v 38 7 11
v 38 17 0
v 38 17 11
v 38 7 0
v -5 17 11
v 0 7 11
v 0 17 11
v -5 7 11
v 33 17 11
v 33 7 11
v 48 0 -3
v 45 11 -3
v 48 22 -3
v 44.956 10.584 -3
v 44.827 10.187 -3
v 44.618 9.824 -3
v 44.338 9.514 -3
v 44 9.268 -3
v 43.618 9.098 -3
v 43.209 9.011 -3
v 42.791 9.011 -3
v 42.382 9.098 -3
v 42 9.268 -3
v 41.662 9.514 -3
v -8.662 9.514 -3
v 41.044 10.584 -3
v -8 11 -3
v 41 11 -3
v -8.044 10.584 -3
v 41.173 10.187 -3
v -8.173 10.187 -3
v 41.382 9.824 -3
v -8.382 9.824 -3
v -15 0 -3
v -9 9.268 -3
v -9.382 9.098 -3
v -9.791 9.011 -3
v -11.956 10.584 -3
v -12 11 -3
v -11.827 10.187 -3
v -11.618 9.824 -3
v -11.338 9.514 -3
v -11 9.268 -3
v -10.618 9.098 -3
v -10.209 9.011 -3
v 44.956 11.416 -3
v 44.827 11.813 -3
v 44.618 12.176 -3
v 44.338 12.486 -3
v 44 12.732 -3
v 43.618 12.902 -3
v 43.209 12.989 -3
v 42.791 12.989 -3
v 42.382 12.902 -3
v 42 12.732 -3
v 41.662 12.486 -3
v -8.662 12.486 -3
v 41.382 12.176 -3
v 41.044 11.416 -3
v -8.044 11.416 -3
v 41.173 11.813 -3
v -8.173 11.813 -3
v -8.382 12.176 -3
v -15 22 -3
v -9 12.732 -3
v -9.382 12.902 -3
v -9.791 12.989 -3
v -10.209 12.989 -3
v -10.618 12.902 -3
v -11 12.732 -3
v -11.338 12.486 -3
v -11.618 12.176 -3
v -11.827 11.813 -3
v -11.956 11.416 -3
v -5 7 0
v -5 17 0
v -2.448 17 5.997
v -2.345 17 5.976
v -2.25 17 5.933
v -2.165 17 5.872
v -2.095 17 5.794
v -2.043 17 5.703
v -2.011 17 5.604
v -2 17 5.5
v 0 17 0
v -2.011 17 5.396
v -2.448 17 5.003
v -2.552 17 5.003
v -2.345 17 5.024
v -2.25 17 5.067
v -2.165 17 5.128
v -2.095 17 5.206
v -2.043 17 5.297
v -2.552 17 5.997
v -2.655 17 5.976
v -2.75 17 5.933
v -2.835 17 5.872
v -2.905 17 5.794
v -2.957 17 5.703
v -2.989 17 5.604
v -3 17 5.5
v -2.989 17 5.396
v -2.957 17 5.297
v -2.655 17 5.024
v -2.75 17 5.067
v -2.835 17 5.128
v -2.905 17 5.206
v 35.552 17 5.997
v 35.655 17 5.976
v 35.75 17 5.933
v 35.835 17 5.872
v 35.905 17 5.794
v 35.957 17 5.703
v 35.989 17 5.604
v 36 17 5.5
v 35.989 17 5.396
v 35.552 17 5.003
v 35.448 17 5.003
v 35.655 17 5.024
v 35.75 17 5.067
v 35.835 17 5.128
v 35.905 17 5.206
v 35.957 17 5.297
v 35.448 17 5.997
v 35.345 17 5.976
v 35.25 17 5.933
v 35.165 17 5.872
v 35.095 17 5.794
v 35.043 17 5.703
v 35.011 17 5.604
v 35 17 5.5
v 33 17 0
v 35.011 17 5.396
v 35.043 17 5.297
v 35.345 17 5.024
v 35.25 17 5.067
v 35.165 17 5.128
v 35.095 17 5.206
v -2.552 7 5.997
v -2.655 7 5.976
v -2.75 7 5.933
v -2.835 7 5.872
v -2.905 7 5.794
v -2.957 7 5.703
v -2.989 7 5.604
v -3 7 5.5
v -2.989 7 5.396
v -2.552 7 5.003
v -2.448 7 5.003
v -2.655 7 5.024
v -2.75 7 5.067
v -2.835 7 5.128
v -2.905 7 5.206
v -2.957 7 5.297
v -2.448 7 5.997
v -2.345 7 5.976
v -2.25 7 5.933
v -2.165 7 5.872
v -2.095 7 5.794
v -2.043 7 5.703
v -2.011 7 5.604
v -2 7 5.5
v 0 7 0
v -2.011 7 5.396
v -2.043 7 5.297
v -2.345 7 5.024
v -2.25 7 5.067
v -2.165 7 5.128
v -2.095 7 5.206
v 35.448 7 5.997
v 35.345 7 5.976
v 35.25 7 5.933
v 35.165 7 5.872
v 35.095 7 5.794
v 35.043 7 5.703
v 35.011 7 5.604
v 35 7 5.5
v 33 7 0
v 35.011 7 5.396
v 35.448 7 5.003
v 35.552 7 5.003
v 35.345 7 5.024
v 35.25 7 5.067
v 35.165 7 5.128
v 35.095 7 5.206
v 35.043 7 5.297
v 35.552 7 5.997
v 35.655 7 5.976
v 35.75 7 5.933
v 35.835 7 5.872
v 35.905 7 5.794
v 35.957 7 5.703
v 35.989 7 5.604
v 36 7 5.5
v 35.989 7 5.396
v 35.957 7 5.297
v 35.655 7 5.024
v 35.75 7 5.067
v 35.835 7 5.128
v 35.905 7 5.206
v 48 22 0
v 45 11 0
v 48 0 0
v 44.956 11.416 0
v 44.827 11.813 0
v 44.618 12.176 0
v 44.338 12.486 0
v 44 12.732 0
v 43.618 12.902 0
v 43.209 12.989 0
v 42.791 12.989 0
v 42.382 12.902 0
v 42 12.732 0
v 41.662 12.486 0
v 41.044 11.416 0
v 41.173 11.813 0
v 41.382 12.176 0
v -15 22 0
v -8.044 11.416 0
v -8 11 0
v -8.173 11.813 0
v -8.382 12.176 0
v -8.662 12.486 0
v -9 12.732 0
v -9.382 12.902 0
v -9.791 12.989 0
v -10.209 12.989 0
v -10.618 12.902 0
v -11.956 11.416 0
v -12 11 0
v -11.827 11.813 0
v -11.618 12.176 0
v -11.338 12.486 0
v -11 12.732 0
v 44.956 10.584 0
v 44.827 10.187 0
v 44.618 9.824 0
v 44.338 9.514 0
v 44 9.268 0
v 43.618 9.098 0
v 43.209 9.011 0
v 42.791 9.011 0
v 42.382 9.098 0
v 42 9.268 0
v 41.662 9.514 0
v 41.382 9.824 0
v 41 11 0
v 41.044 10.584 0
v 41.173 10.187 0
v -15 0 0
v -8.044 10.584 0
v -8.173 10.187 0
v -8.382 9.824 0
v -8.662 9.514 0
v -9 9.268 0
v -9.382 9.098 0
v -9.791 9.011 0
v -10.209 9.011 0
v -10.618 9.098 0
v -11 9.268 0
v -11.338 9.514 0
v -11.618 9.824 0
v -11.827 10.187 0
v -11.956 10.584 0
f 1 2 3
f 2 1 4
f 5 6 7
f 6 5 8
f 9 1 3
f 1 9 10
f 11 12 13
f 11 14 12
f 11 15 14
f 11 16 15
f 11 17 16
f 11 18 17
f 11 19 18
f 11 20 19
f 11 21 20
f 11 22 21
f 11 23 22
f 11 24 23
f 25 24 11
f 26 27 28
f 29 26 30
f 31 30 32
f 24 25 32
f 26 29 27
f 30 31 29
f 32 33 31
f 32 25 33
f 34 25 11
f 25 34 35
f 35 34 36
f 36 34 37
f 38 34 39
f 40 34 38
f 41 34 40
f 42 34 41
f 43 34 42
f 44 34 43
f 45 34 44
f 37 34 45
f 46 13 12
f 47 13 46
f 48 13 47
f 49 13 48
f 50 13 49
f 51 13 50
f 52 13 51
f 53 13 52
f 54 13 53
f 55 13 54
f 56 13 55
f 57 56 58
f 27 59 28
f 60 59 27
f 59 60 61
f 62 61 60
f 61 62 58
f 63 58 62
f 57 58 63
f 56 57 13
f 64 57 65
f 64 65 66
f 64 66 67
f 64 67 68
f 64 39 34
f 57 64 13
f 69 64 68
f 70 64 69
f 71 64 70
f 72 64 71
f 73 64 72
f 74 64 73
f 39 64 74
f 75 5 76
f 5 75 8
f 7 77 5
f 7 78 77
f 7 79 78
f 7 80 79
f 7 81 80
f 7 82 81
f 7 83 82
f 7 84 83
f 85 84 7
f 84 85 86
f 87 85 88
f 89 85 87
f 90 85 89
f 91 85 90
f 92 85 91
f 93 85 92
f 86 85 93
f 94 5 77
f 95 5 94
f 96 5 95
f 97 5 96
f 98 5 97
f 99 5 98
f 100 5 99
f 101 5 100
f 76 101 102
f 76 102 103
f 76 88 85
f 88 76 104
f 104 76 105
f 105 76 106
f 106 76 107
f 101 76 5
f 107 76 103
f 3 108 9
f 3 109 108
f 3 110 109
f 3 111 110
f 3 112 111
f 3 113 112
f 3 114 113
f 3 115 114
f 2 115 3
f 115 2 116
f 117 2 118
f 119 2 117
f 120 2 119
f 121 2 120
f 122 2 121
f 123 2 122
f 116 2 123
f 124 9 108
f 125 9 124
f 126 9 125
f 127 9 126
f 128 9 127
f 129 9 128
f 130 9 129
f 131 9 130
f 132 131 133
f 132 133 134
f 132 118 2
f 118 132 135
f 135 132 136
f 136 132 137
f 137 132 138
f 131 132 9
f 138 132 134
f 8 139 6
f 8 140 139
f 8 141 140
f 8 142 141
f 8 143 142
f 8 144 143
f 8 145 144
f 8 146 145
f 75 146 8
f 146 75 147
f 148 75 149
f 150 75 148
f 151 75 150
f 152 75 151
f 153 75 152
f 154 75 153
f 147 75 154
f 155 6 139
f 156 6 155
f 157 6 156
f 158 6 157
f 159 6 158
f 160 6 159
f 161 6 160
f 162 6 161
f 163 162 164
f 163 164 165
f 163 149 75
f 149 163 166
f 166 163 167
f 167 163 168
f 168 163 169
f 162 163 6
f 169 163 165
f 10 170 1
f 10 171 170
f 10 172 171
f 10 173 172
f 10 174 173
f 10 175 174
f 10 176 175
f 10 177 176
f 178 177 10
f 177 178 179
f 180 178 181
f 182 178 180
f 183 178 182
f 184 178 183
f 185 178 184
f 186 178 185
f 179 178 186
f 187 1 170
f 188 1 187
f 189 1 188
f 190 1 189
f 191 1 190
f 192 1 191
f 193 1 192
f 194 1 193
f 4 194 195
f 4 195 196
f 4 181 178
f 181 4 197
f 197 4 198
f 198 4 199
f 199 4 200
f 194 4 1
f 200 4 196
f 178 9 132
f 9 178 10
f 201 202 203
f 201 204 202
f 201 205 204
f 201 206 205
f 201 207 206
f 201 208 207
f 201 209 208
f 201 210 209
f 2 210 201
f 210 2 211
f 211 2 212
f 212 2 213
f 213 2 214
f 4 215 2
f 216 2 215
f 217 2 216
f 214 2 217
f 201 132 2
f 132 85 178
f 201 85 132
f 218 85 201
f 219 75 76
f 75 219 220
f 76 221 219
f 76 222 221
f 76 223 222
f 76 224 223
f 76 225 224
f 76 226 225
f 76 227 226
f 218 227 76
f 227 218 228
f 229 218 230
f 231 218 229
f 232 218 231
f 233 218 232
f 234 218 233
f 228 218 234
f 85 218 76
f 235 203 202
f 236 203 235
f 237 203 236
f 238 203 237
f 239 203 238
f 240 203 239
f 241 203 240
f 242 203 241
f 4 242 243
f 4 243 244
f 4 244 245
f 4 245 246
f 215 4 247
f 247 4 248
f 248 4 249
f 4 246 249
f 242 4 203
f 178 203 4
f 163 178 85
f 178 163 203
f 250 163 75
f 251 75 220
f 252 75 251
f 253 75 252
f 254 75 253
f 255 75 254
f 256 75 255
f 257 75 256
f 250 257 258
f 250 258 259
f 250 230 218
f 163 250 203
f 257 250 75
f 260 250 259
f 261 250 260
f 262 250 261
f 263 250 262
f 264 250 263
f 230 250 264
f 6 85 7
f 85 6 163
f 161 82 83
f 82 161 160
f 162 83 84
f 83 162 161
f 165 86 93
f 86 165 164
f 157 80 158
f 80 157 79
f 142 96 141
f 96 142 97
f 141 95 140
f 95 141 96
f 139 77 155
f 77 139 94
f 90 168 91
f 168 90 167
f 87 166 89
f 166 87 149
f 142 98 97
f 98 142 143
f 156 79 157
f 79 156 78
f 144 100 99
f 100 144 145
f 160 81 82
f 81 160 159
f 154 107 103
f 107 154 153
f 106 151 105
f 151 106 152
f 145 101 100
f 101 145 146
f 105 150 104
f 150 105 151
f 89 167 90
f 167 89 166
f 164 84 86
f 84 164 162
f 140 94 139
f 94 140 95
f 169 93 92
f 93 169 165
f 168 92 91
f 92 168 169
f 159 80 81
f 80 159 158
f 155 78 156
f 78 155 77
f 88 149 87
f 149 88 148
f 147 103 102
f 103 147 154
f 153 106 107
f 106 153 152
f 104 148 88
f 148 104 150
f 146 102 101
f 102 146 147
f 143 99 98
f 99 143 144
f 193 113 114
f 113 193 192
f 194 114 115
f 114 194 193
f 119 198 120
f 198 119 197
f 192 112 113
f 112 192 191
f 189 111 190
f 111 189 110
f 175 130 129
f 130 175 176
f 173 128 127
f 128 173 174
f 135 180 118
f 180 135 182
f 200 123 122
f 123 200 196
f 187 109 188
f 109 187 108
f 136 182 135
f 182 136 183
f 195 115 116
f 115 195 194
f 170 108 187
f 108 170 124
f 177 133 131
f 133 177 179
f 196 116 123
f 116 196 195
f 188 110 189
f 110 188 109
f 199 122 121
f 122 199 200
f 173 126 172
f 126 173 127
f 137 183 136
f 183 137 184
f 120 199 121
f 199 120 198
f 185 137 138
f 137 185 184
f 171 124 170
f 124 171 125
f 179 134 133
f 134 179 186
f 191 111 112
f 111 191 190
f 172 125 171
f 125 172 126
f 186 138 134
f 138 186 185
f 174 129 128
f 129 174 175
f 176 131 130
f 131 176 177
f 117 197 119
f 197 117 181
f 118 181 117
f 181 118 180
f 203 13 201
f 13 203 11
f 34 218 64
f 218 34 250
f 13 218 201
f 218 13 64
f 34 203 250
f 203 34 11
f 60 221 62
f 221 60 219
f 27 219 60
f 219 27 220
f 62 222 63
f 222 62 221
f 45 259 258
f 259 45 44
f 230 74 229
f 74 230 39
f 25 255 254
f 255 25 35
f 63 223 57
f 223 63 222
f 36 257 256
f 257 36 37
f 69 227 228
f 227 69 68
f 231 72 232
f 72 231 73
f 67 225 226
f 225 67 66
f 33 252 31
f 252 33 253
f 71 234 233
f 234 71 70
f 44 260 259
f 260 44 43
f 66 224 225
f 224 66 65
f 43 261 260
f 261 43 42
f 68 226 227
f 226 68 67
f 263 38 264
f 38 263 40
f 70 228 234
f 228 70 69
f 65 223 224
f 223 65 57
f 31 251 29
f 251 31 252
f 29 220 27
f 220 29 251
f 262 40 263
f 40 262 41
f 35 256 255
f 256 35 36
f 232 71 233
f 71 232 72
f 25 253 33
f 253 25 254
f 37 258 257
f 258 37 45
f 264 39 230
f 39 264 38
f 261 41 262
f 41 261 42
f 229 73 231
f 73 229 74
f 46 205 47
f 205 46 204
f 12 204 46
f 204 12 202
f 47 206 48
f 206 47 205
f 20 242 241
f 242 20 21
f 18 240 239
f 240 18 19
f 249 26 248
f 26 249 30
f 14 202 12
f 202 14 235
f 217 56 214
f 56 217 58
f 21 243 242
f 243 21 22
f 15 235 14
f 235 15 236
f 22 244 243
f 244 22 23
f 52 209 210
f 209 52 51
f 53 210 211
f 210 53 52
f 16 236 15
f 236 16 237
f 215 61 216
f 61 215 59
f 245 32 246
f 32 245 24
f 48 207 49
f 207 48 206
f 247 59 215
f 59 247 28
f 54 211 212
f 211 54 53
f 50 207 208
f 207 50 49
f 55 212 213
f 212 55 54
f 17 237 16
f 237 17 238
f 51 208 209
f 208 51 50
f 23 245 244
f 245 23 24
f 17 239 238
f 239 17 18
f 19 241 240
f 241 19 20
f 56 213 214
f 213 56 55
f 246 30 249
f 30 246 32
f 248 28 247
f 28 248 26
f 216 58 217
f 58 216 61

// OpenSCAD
// file: micro_servo.scad
include <micro_servo_h.scad>
$fn=30;


// these are bracket constants
micro_servo();

module micro_servo() {
    // body
    cube([body_x,body_y,body_z]);
    // tabs
    difference() {
        color(body_color) translate([-tab_len,tab_offset,0]) cube([body_x + tab_len*2, tab_t, body_z]);
        translate( [-tab_len/2,tab_offset+tab_t+1, body_z/2]) rotate([90,0,0]) cylinder(r=tab_mount_r,h=tab_t+2);
        translate( [body_x+tab_len/2,tab_offset+tab_t+1, body_z/2]) rotate([90,0,0]) cylinder(r=tab_mount_r,h=tab_t+2);

    }

    // barrel
    color(body_color) translate( [shaft_offset, 0, body_z/2]) rotate([90,0,0]) cylinder( r=barrel_r, h=barrel_len);
    // shaft
    color(shaft_color) translate( [shaft_offset, -barrel_len, body_z/2]) rotate([90,0,0]) cylinder( r=shaft_r, h=shaft_l);
}
// file: micro_servo_h.scad
t = 3;
// these are the servo size constants
// full size of the body
body_x = 33;
body_y = 22;
body_z = 11;
tab_len = 5;
tab_t = 1;
tab_offset=6;
tab_mount_r=0.5;
shaft_offset = 5.5;
shaft_len = 3;  // beyond the barrel
shaft_r = 2;
barrel_len=4;
barrel_r=5.5;
body_color="grey";
shaft_color="white";
// main file
include<micro_servo_h.scad>
use<micro_servo.scad>;

$fn=30;
t=3;
base_tab_w =10;
mnt_hole_r = 2;
// color("red") micro_servo();

difference () {
    translate([ -tab_len, tab_t+tab_offset, -t ] ) cube([body_x + 2 * tab_len, body_y/2-tab_t, body_z+t]);
    cube([body_x, body_y, body_z]);
    translate( [-tab_len/2,tab_offset+tab_t+body_y, body_z/2]) rotate([90,0,0]) cylinder(r=tab_mount_r,h=body_y);
    translate( [body_x+tab_len/2,tab_offset+tab_t+body_y, body_z/2]) rotate([90,0,0]) cylinder(r=tab_mount_r,h=tab_t+body_y);
}

difference() {
    translate([ -tab_len-base_tab_w, 0, -t] ) cube( [body_x + 2 * tab_len+2*base_tab_w, body_y, t] ) ;
    translate([ -tab_len-base_tab_w/2,body_y/2,-t-1 ] ) cylinder( r=mnt_hole_r, h=t+2);
    translate([ body_x+base_tab_w/2+tab_len,body_y/2,-t-1 ] ) cylinder( r=mnt_hole_r, h=t+2);

}
